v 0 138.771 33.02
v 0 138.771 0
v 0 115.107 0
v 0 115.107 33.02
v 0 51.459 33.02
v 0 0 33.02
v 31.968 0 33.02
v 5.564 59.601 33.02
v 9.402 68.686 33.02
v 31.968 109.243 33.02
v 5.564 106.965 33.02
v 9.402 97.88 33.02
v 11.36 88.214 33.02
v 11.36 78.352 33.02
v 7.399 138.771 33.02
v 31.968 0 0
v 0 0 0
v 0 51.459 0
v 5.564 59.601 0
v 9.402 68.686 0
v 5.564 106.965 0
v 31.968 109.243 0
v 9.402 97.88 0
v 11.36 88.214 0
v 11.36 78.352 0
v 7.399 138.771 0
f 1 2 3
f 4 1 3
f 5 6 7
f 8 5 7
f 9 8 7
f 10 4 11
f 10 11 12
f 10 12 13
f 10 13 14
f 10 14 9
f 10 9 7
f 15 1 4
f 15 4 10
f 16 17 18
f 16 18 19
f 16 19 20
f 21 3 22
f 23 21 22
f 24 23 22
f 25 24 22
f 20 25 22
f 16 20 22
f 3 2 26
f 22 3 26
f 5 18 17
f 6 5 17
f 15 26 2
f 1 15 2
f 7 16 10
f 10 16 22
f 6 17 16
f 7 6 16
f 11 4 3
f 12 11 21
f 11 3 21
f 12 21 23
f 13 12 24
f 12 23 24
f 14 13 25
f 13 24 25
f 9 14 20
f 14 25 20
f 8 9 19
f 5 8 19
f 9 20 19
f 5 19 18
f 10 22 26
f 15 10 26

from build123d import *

# Parameters (mm, degrees)
BOSS_EXTRUDE1_DEPTH = 33.02


with BuildPart() as part:
    # Sketch1 → Boss-Extrude1 (new body)
    with BuildSketch(Plane.XY):
        with BuildLine():
            Line((0, 0), (31.968493198, 0))
            Line((31.968493198, 0), (31.968493198, 109.242995925))
            Line((31.968493198, 109.242995925), (7.399294942, 138.771204316))
            Line((7.399294942, 138.771204316), (0, 138.771204316))
            Line((0, 138.771204316), (0, 115.1068086))
            ThreePointArc((0, 115.1068086), (11.60619963, 83.282987393), (0, 51.459166187))
            Line((0, 51.459166187), (0, 0))
        make_face()
    extrude(amount=BOSS_EXTRUDE1_DEPTH)


solid = part.part
